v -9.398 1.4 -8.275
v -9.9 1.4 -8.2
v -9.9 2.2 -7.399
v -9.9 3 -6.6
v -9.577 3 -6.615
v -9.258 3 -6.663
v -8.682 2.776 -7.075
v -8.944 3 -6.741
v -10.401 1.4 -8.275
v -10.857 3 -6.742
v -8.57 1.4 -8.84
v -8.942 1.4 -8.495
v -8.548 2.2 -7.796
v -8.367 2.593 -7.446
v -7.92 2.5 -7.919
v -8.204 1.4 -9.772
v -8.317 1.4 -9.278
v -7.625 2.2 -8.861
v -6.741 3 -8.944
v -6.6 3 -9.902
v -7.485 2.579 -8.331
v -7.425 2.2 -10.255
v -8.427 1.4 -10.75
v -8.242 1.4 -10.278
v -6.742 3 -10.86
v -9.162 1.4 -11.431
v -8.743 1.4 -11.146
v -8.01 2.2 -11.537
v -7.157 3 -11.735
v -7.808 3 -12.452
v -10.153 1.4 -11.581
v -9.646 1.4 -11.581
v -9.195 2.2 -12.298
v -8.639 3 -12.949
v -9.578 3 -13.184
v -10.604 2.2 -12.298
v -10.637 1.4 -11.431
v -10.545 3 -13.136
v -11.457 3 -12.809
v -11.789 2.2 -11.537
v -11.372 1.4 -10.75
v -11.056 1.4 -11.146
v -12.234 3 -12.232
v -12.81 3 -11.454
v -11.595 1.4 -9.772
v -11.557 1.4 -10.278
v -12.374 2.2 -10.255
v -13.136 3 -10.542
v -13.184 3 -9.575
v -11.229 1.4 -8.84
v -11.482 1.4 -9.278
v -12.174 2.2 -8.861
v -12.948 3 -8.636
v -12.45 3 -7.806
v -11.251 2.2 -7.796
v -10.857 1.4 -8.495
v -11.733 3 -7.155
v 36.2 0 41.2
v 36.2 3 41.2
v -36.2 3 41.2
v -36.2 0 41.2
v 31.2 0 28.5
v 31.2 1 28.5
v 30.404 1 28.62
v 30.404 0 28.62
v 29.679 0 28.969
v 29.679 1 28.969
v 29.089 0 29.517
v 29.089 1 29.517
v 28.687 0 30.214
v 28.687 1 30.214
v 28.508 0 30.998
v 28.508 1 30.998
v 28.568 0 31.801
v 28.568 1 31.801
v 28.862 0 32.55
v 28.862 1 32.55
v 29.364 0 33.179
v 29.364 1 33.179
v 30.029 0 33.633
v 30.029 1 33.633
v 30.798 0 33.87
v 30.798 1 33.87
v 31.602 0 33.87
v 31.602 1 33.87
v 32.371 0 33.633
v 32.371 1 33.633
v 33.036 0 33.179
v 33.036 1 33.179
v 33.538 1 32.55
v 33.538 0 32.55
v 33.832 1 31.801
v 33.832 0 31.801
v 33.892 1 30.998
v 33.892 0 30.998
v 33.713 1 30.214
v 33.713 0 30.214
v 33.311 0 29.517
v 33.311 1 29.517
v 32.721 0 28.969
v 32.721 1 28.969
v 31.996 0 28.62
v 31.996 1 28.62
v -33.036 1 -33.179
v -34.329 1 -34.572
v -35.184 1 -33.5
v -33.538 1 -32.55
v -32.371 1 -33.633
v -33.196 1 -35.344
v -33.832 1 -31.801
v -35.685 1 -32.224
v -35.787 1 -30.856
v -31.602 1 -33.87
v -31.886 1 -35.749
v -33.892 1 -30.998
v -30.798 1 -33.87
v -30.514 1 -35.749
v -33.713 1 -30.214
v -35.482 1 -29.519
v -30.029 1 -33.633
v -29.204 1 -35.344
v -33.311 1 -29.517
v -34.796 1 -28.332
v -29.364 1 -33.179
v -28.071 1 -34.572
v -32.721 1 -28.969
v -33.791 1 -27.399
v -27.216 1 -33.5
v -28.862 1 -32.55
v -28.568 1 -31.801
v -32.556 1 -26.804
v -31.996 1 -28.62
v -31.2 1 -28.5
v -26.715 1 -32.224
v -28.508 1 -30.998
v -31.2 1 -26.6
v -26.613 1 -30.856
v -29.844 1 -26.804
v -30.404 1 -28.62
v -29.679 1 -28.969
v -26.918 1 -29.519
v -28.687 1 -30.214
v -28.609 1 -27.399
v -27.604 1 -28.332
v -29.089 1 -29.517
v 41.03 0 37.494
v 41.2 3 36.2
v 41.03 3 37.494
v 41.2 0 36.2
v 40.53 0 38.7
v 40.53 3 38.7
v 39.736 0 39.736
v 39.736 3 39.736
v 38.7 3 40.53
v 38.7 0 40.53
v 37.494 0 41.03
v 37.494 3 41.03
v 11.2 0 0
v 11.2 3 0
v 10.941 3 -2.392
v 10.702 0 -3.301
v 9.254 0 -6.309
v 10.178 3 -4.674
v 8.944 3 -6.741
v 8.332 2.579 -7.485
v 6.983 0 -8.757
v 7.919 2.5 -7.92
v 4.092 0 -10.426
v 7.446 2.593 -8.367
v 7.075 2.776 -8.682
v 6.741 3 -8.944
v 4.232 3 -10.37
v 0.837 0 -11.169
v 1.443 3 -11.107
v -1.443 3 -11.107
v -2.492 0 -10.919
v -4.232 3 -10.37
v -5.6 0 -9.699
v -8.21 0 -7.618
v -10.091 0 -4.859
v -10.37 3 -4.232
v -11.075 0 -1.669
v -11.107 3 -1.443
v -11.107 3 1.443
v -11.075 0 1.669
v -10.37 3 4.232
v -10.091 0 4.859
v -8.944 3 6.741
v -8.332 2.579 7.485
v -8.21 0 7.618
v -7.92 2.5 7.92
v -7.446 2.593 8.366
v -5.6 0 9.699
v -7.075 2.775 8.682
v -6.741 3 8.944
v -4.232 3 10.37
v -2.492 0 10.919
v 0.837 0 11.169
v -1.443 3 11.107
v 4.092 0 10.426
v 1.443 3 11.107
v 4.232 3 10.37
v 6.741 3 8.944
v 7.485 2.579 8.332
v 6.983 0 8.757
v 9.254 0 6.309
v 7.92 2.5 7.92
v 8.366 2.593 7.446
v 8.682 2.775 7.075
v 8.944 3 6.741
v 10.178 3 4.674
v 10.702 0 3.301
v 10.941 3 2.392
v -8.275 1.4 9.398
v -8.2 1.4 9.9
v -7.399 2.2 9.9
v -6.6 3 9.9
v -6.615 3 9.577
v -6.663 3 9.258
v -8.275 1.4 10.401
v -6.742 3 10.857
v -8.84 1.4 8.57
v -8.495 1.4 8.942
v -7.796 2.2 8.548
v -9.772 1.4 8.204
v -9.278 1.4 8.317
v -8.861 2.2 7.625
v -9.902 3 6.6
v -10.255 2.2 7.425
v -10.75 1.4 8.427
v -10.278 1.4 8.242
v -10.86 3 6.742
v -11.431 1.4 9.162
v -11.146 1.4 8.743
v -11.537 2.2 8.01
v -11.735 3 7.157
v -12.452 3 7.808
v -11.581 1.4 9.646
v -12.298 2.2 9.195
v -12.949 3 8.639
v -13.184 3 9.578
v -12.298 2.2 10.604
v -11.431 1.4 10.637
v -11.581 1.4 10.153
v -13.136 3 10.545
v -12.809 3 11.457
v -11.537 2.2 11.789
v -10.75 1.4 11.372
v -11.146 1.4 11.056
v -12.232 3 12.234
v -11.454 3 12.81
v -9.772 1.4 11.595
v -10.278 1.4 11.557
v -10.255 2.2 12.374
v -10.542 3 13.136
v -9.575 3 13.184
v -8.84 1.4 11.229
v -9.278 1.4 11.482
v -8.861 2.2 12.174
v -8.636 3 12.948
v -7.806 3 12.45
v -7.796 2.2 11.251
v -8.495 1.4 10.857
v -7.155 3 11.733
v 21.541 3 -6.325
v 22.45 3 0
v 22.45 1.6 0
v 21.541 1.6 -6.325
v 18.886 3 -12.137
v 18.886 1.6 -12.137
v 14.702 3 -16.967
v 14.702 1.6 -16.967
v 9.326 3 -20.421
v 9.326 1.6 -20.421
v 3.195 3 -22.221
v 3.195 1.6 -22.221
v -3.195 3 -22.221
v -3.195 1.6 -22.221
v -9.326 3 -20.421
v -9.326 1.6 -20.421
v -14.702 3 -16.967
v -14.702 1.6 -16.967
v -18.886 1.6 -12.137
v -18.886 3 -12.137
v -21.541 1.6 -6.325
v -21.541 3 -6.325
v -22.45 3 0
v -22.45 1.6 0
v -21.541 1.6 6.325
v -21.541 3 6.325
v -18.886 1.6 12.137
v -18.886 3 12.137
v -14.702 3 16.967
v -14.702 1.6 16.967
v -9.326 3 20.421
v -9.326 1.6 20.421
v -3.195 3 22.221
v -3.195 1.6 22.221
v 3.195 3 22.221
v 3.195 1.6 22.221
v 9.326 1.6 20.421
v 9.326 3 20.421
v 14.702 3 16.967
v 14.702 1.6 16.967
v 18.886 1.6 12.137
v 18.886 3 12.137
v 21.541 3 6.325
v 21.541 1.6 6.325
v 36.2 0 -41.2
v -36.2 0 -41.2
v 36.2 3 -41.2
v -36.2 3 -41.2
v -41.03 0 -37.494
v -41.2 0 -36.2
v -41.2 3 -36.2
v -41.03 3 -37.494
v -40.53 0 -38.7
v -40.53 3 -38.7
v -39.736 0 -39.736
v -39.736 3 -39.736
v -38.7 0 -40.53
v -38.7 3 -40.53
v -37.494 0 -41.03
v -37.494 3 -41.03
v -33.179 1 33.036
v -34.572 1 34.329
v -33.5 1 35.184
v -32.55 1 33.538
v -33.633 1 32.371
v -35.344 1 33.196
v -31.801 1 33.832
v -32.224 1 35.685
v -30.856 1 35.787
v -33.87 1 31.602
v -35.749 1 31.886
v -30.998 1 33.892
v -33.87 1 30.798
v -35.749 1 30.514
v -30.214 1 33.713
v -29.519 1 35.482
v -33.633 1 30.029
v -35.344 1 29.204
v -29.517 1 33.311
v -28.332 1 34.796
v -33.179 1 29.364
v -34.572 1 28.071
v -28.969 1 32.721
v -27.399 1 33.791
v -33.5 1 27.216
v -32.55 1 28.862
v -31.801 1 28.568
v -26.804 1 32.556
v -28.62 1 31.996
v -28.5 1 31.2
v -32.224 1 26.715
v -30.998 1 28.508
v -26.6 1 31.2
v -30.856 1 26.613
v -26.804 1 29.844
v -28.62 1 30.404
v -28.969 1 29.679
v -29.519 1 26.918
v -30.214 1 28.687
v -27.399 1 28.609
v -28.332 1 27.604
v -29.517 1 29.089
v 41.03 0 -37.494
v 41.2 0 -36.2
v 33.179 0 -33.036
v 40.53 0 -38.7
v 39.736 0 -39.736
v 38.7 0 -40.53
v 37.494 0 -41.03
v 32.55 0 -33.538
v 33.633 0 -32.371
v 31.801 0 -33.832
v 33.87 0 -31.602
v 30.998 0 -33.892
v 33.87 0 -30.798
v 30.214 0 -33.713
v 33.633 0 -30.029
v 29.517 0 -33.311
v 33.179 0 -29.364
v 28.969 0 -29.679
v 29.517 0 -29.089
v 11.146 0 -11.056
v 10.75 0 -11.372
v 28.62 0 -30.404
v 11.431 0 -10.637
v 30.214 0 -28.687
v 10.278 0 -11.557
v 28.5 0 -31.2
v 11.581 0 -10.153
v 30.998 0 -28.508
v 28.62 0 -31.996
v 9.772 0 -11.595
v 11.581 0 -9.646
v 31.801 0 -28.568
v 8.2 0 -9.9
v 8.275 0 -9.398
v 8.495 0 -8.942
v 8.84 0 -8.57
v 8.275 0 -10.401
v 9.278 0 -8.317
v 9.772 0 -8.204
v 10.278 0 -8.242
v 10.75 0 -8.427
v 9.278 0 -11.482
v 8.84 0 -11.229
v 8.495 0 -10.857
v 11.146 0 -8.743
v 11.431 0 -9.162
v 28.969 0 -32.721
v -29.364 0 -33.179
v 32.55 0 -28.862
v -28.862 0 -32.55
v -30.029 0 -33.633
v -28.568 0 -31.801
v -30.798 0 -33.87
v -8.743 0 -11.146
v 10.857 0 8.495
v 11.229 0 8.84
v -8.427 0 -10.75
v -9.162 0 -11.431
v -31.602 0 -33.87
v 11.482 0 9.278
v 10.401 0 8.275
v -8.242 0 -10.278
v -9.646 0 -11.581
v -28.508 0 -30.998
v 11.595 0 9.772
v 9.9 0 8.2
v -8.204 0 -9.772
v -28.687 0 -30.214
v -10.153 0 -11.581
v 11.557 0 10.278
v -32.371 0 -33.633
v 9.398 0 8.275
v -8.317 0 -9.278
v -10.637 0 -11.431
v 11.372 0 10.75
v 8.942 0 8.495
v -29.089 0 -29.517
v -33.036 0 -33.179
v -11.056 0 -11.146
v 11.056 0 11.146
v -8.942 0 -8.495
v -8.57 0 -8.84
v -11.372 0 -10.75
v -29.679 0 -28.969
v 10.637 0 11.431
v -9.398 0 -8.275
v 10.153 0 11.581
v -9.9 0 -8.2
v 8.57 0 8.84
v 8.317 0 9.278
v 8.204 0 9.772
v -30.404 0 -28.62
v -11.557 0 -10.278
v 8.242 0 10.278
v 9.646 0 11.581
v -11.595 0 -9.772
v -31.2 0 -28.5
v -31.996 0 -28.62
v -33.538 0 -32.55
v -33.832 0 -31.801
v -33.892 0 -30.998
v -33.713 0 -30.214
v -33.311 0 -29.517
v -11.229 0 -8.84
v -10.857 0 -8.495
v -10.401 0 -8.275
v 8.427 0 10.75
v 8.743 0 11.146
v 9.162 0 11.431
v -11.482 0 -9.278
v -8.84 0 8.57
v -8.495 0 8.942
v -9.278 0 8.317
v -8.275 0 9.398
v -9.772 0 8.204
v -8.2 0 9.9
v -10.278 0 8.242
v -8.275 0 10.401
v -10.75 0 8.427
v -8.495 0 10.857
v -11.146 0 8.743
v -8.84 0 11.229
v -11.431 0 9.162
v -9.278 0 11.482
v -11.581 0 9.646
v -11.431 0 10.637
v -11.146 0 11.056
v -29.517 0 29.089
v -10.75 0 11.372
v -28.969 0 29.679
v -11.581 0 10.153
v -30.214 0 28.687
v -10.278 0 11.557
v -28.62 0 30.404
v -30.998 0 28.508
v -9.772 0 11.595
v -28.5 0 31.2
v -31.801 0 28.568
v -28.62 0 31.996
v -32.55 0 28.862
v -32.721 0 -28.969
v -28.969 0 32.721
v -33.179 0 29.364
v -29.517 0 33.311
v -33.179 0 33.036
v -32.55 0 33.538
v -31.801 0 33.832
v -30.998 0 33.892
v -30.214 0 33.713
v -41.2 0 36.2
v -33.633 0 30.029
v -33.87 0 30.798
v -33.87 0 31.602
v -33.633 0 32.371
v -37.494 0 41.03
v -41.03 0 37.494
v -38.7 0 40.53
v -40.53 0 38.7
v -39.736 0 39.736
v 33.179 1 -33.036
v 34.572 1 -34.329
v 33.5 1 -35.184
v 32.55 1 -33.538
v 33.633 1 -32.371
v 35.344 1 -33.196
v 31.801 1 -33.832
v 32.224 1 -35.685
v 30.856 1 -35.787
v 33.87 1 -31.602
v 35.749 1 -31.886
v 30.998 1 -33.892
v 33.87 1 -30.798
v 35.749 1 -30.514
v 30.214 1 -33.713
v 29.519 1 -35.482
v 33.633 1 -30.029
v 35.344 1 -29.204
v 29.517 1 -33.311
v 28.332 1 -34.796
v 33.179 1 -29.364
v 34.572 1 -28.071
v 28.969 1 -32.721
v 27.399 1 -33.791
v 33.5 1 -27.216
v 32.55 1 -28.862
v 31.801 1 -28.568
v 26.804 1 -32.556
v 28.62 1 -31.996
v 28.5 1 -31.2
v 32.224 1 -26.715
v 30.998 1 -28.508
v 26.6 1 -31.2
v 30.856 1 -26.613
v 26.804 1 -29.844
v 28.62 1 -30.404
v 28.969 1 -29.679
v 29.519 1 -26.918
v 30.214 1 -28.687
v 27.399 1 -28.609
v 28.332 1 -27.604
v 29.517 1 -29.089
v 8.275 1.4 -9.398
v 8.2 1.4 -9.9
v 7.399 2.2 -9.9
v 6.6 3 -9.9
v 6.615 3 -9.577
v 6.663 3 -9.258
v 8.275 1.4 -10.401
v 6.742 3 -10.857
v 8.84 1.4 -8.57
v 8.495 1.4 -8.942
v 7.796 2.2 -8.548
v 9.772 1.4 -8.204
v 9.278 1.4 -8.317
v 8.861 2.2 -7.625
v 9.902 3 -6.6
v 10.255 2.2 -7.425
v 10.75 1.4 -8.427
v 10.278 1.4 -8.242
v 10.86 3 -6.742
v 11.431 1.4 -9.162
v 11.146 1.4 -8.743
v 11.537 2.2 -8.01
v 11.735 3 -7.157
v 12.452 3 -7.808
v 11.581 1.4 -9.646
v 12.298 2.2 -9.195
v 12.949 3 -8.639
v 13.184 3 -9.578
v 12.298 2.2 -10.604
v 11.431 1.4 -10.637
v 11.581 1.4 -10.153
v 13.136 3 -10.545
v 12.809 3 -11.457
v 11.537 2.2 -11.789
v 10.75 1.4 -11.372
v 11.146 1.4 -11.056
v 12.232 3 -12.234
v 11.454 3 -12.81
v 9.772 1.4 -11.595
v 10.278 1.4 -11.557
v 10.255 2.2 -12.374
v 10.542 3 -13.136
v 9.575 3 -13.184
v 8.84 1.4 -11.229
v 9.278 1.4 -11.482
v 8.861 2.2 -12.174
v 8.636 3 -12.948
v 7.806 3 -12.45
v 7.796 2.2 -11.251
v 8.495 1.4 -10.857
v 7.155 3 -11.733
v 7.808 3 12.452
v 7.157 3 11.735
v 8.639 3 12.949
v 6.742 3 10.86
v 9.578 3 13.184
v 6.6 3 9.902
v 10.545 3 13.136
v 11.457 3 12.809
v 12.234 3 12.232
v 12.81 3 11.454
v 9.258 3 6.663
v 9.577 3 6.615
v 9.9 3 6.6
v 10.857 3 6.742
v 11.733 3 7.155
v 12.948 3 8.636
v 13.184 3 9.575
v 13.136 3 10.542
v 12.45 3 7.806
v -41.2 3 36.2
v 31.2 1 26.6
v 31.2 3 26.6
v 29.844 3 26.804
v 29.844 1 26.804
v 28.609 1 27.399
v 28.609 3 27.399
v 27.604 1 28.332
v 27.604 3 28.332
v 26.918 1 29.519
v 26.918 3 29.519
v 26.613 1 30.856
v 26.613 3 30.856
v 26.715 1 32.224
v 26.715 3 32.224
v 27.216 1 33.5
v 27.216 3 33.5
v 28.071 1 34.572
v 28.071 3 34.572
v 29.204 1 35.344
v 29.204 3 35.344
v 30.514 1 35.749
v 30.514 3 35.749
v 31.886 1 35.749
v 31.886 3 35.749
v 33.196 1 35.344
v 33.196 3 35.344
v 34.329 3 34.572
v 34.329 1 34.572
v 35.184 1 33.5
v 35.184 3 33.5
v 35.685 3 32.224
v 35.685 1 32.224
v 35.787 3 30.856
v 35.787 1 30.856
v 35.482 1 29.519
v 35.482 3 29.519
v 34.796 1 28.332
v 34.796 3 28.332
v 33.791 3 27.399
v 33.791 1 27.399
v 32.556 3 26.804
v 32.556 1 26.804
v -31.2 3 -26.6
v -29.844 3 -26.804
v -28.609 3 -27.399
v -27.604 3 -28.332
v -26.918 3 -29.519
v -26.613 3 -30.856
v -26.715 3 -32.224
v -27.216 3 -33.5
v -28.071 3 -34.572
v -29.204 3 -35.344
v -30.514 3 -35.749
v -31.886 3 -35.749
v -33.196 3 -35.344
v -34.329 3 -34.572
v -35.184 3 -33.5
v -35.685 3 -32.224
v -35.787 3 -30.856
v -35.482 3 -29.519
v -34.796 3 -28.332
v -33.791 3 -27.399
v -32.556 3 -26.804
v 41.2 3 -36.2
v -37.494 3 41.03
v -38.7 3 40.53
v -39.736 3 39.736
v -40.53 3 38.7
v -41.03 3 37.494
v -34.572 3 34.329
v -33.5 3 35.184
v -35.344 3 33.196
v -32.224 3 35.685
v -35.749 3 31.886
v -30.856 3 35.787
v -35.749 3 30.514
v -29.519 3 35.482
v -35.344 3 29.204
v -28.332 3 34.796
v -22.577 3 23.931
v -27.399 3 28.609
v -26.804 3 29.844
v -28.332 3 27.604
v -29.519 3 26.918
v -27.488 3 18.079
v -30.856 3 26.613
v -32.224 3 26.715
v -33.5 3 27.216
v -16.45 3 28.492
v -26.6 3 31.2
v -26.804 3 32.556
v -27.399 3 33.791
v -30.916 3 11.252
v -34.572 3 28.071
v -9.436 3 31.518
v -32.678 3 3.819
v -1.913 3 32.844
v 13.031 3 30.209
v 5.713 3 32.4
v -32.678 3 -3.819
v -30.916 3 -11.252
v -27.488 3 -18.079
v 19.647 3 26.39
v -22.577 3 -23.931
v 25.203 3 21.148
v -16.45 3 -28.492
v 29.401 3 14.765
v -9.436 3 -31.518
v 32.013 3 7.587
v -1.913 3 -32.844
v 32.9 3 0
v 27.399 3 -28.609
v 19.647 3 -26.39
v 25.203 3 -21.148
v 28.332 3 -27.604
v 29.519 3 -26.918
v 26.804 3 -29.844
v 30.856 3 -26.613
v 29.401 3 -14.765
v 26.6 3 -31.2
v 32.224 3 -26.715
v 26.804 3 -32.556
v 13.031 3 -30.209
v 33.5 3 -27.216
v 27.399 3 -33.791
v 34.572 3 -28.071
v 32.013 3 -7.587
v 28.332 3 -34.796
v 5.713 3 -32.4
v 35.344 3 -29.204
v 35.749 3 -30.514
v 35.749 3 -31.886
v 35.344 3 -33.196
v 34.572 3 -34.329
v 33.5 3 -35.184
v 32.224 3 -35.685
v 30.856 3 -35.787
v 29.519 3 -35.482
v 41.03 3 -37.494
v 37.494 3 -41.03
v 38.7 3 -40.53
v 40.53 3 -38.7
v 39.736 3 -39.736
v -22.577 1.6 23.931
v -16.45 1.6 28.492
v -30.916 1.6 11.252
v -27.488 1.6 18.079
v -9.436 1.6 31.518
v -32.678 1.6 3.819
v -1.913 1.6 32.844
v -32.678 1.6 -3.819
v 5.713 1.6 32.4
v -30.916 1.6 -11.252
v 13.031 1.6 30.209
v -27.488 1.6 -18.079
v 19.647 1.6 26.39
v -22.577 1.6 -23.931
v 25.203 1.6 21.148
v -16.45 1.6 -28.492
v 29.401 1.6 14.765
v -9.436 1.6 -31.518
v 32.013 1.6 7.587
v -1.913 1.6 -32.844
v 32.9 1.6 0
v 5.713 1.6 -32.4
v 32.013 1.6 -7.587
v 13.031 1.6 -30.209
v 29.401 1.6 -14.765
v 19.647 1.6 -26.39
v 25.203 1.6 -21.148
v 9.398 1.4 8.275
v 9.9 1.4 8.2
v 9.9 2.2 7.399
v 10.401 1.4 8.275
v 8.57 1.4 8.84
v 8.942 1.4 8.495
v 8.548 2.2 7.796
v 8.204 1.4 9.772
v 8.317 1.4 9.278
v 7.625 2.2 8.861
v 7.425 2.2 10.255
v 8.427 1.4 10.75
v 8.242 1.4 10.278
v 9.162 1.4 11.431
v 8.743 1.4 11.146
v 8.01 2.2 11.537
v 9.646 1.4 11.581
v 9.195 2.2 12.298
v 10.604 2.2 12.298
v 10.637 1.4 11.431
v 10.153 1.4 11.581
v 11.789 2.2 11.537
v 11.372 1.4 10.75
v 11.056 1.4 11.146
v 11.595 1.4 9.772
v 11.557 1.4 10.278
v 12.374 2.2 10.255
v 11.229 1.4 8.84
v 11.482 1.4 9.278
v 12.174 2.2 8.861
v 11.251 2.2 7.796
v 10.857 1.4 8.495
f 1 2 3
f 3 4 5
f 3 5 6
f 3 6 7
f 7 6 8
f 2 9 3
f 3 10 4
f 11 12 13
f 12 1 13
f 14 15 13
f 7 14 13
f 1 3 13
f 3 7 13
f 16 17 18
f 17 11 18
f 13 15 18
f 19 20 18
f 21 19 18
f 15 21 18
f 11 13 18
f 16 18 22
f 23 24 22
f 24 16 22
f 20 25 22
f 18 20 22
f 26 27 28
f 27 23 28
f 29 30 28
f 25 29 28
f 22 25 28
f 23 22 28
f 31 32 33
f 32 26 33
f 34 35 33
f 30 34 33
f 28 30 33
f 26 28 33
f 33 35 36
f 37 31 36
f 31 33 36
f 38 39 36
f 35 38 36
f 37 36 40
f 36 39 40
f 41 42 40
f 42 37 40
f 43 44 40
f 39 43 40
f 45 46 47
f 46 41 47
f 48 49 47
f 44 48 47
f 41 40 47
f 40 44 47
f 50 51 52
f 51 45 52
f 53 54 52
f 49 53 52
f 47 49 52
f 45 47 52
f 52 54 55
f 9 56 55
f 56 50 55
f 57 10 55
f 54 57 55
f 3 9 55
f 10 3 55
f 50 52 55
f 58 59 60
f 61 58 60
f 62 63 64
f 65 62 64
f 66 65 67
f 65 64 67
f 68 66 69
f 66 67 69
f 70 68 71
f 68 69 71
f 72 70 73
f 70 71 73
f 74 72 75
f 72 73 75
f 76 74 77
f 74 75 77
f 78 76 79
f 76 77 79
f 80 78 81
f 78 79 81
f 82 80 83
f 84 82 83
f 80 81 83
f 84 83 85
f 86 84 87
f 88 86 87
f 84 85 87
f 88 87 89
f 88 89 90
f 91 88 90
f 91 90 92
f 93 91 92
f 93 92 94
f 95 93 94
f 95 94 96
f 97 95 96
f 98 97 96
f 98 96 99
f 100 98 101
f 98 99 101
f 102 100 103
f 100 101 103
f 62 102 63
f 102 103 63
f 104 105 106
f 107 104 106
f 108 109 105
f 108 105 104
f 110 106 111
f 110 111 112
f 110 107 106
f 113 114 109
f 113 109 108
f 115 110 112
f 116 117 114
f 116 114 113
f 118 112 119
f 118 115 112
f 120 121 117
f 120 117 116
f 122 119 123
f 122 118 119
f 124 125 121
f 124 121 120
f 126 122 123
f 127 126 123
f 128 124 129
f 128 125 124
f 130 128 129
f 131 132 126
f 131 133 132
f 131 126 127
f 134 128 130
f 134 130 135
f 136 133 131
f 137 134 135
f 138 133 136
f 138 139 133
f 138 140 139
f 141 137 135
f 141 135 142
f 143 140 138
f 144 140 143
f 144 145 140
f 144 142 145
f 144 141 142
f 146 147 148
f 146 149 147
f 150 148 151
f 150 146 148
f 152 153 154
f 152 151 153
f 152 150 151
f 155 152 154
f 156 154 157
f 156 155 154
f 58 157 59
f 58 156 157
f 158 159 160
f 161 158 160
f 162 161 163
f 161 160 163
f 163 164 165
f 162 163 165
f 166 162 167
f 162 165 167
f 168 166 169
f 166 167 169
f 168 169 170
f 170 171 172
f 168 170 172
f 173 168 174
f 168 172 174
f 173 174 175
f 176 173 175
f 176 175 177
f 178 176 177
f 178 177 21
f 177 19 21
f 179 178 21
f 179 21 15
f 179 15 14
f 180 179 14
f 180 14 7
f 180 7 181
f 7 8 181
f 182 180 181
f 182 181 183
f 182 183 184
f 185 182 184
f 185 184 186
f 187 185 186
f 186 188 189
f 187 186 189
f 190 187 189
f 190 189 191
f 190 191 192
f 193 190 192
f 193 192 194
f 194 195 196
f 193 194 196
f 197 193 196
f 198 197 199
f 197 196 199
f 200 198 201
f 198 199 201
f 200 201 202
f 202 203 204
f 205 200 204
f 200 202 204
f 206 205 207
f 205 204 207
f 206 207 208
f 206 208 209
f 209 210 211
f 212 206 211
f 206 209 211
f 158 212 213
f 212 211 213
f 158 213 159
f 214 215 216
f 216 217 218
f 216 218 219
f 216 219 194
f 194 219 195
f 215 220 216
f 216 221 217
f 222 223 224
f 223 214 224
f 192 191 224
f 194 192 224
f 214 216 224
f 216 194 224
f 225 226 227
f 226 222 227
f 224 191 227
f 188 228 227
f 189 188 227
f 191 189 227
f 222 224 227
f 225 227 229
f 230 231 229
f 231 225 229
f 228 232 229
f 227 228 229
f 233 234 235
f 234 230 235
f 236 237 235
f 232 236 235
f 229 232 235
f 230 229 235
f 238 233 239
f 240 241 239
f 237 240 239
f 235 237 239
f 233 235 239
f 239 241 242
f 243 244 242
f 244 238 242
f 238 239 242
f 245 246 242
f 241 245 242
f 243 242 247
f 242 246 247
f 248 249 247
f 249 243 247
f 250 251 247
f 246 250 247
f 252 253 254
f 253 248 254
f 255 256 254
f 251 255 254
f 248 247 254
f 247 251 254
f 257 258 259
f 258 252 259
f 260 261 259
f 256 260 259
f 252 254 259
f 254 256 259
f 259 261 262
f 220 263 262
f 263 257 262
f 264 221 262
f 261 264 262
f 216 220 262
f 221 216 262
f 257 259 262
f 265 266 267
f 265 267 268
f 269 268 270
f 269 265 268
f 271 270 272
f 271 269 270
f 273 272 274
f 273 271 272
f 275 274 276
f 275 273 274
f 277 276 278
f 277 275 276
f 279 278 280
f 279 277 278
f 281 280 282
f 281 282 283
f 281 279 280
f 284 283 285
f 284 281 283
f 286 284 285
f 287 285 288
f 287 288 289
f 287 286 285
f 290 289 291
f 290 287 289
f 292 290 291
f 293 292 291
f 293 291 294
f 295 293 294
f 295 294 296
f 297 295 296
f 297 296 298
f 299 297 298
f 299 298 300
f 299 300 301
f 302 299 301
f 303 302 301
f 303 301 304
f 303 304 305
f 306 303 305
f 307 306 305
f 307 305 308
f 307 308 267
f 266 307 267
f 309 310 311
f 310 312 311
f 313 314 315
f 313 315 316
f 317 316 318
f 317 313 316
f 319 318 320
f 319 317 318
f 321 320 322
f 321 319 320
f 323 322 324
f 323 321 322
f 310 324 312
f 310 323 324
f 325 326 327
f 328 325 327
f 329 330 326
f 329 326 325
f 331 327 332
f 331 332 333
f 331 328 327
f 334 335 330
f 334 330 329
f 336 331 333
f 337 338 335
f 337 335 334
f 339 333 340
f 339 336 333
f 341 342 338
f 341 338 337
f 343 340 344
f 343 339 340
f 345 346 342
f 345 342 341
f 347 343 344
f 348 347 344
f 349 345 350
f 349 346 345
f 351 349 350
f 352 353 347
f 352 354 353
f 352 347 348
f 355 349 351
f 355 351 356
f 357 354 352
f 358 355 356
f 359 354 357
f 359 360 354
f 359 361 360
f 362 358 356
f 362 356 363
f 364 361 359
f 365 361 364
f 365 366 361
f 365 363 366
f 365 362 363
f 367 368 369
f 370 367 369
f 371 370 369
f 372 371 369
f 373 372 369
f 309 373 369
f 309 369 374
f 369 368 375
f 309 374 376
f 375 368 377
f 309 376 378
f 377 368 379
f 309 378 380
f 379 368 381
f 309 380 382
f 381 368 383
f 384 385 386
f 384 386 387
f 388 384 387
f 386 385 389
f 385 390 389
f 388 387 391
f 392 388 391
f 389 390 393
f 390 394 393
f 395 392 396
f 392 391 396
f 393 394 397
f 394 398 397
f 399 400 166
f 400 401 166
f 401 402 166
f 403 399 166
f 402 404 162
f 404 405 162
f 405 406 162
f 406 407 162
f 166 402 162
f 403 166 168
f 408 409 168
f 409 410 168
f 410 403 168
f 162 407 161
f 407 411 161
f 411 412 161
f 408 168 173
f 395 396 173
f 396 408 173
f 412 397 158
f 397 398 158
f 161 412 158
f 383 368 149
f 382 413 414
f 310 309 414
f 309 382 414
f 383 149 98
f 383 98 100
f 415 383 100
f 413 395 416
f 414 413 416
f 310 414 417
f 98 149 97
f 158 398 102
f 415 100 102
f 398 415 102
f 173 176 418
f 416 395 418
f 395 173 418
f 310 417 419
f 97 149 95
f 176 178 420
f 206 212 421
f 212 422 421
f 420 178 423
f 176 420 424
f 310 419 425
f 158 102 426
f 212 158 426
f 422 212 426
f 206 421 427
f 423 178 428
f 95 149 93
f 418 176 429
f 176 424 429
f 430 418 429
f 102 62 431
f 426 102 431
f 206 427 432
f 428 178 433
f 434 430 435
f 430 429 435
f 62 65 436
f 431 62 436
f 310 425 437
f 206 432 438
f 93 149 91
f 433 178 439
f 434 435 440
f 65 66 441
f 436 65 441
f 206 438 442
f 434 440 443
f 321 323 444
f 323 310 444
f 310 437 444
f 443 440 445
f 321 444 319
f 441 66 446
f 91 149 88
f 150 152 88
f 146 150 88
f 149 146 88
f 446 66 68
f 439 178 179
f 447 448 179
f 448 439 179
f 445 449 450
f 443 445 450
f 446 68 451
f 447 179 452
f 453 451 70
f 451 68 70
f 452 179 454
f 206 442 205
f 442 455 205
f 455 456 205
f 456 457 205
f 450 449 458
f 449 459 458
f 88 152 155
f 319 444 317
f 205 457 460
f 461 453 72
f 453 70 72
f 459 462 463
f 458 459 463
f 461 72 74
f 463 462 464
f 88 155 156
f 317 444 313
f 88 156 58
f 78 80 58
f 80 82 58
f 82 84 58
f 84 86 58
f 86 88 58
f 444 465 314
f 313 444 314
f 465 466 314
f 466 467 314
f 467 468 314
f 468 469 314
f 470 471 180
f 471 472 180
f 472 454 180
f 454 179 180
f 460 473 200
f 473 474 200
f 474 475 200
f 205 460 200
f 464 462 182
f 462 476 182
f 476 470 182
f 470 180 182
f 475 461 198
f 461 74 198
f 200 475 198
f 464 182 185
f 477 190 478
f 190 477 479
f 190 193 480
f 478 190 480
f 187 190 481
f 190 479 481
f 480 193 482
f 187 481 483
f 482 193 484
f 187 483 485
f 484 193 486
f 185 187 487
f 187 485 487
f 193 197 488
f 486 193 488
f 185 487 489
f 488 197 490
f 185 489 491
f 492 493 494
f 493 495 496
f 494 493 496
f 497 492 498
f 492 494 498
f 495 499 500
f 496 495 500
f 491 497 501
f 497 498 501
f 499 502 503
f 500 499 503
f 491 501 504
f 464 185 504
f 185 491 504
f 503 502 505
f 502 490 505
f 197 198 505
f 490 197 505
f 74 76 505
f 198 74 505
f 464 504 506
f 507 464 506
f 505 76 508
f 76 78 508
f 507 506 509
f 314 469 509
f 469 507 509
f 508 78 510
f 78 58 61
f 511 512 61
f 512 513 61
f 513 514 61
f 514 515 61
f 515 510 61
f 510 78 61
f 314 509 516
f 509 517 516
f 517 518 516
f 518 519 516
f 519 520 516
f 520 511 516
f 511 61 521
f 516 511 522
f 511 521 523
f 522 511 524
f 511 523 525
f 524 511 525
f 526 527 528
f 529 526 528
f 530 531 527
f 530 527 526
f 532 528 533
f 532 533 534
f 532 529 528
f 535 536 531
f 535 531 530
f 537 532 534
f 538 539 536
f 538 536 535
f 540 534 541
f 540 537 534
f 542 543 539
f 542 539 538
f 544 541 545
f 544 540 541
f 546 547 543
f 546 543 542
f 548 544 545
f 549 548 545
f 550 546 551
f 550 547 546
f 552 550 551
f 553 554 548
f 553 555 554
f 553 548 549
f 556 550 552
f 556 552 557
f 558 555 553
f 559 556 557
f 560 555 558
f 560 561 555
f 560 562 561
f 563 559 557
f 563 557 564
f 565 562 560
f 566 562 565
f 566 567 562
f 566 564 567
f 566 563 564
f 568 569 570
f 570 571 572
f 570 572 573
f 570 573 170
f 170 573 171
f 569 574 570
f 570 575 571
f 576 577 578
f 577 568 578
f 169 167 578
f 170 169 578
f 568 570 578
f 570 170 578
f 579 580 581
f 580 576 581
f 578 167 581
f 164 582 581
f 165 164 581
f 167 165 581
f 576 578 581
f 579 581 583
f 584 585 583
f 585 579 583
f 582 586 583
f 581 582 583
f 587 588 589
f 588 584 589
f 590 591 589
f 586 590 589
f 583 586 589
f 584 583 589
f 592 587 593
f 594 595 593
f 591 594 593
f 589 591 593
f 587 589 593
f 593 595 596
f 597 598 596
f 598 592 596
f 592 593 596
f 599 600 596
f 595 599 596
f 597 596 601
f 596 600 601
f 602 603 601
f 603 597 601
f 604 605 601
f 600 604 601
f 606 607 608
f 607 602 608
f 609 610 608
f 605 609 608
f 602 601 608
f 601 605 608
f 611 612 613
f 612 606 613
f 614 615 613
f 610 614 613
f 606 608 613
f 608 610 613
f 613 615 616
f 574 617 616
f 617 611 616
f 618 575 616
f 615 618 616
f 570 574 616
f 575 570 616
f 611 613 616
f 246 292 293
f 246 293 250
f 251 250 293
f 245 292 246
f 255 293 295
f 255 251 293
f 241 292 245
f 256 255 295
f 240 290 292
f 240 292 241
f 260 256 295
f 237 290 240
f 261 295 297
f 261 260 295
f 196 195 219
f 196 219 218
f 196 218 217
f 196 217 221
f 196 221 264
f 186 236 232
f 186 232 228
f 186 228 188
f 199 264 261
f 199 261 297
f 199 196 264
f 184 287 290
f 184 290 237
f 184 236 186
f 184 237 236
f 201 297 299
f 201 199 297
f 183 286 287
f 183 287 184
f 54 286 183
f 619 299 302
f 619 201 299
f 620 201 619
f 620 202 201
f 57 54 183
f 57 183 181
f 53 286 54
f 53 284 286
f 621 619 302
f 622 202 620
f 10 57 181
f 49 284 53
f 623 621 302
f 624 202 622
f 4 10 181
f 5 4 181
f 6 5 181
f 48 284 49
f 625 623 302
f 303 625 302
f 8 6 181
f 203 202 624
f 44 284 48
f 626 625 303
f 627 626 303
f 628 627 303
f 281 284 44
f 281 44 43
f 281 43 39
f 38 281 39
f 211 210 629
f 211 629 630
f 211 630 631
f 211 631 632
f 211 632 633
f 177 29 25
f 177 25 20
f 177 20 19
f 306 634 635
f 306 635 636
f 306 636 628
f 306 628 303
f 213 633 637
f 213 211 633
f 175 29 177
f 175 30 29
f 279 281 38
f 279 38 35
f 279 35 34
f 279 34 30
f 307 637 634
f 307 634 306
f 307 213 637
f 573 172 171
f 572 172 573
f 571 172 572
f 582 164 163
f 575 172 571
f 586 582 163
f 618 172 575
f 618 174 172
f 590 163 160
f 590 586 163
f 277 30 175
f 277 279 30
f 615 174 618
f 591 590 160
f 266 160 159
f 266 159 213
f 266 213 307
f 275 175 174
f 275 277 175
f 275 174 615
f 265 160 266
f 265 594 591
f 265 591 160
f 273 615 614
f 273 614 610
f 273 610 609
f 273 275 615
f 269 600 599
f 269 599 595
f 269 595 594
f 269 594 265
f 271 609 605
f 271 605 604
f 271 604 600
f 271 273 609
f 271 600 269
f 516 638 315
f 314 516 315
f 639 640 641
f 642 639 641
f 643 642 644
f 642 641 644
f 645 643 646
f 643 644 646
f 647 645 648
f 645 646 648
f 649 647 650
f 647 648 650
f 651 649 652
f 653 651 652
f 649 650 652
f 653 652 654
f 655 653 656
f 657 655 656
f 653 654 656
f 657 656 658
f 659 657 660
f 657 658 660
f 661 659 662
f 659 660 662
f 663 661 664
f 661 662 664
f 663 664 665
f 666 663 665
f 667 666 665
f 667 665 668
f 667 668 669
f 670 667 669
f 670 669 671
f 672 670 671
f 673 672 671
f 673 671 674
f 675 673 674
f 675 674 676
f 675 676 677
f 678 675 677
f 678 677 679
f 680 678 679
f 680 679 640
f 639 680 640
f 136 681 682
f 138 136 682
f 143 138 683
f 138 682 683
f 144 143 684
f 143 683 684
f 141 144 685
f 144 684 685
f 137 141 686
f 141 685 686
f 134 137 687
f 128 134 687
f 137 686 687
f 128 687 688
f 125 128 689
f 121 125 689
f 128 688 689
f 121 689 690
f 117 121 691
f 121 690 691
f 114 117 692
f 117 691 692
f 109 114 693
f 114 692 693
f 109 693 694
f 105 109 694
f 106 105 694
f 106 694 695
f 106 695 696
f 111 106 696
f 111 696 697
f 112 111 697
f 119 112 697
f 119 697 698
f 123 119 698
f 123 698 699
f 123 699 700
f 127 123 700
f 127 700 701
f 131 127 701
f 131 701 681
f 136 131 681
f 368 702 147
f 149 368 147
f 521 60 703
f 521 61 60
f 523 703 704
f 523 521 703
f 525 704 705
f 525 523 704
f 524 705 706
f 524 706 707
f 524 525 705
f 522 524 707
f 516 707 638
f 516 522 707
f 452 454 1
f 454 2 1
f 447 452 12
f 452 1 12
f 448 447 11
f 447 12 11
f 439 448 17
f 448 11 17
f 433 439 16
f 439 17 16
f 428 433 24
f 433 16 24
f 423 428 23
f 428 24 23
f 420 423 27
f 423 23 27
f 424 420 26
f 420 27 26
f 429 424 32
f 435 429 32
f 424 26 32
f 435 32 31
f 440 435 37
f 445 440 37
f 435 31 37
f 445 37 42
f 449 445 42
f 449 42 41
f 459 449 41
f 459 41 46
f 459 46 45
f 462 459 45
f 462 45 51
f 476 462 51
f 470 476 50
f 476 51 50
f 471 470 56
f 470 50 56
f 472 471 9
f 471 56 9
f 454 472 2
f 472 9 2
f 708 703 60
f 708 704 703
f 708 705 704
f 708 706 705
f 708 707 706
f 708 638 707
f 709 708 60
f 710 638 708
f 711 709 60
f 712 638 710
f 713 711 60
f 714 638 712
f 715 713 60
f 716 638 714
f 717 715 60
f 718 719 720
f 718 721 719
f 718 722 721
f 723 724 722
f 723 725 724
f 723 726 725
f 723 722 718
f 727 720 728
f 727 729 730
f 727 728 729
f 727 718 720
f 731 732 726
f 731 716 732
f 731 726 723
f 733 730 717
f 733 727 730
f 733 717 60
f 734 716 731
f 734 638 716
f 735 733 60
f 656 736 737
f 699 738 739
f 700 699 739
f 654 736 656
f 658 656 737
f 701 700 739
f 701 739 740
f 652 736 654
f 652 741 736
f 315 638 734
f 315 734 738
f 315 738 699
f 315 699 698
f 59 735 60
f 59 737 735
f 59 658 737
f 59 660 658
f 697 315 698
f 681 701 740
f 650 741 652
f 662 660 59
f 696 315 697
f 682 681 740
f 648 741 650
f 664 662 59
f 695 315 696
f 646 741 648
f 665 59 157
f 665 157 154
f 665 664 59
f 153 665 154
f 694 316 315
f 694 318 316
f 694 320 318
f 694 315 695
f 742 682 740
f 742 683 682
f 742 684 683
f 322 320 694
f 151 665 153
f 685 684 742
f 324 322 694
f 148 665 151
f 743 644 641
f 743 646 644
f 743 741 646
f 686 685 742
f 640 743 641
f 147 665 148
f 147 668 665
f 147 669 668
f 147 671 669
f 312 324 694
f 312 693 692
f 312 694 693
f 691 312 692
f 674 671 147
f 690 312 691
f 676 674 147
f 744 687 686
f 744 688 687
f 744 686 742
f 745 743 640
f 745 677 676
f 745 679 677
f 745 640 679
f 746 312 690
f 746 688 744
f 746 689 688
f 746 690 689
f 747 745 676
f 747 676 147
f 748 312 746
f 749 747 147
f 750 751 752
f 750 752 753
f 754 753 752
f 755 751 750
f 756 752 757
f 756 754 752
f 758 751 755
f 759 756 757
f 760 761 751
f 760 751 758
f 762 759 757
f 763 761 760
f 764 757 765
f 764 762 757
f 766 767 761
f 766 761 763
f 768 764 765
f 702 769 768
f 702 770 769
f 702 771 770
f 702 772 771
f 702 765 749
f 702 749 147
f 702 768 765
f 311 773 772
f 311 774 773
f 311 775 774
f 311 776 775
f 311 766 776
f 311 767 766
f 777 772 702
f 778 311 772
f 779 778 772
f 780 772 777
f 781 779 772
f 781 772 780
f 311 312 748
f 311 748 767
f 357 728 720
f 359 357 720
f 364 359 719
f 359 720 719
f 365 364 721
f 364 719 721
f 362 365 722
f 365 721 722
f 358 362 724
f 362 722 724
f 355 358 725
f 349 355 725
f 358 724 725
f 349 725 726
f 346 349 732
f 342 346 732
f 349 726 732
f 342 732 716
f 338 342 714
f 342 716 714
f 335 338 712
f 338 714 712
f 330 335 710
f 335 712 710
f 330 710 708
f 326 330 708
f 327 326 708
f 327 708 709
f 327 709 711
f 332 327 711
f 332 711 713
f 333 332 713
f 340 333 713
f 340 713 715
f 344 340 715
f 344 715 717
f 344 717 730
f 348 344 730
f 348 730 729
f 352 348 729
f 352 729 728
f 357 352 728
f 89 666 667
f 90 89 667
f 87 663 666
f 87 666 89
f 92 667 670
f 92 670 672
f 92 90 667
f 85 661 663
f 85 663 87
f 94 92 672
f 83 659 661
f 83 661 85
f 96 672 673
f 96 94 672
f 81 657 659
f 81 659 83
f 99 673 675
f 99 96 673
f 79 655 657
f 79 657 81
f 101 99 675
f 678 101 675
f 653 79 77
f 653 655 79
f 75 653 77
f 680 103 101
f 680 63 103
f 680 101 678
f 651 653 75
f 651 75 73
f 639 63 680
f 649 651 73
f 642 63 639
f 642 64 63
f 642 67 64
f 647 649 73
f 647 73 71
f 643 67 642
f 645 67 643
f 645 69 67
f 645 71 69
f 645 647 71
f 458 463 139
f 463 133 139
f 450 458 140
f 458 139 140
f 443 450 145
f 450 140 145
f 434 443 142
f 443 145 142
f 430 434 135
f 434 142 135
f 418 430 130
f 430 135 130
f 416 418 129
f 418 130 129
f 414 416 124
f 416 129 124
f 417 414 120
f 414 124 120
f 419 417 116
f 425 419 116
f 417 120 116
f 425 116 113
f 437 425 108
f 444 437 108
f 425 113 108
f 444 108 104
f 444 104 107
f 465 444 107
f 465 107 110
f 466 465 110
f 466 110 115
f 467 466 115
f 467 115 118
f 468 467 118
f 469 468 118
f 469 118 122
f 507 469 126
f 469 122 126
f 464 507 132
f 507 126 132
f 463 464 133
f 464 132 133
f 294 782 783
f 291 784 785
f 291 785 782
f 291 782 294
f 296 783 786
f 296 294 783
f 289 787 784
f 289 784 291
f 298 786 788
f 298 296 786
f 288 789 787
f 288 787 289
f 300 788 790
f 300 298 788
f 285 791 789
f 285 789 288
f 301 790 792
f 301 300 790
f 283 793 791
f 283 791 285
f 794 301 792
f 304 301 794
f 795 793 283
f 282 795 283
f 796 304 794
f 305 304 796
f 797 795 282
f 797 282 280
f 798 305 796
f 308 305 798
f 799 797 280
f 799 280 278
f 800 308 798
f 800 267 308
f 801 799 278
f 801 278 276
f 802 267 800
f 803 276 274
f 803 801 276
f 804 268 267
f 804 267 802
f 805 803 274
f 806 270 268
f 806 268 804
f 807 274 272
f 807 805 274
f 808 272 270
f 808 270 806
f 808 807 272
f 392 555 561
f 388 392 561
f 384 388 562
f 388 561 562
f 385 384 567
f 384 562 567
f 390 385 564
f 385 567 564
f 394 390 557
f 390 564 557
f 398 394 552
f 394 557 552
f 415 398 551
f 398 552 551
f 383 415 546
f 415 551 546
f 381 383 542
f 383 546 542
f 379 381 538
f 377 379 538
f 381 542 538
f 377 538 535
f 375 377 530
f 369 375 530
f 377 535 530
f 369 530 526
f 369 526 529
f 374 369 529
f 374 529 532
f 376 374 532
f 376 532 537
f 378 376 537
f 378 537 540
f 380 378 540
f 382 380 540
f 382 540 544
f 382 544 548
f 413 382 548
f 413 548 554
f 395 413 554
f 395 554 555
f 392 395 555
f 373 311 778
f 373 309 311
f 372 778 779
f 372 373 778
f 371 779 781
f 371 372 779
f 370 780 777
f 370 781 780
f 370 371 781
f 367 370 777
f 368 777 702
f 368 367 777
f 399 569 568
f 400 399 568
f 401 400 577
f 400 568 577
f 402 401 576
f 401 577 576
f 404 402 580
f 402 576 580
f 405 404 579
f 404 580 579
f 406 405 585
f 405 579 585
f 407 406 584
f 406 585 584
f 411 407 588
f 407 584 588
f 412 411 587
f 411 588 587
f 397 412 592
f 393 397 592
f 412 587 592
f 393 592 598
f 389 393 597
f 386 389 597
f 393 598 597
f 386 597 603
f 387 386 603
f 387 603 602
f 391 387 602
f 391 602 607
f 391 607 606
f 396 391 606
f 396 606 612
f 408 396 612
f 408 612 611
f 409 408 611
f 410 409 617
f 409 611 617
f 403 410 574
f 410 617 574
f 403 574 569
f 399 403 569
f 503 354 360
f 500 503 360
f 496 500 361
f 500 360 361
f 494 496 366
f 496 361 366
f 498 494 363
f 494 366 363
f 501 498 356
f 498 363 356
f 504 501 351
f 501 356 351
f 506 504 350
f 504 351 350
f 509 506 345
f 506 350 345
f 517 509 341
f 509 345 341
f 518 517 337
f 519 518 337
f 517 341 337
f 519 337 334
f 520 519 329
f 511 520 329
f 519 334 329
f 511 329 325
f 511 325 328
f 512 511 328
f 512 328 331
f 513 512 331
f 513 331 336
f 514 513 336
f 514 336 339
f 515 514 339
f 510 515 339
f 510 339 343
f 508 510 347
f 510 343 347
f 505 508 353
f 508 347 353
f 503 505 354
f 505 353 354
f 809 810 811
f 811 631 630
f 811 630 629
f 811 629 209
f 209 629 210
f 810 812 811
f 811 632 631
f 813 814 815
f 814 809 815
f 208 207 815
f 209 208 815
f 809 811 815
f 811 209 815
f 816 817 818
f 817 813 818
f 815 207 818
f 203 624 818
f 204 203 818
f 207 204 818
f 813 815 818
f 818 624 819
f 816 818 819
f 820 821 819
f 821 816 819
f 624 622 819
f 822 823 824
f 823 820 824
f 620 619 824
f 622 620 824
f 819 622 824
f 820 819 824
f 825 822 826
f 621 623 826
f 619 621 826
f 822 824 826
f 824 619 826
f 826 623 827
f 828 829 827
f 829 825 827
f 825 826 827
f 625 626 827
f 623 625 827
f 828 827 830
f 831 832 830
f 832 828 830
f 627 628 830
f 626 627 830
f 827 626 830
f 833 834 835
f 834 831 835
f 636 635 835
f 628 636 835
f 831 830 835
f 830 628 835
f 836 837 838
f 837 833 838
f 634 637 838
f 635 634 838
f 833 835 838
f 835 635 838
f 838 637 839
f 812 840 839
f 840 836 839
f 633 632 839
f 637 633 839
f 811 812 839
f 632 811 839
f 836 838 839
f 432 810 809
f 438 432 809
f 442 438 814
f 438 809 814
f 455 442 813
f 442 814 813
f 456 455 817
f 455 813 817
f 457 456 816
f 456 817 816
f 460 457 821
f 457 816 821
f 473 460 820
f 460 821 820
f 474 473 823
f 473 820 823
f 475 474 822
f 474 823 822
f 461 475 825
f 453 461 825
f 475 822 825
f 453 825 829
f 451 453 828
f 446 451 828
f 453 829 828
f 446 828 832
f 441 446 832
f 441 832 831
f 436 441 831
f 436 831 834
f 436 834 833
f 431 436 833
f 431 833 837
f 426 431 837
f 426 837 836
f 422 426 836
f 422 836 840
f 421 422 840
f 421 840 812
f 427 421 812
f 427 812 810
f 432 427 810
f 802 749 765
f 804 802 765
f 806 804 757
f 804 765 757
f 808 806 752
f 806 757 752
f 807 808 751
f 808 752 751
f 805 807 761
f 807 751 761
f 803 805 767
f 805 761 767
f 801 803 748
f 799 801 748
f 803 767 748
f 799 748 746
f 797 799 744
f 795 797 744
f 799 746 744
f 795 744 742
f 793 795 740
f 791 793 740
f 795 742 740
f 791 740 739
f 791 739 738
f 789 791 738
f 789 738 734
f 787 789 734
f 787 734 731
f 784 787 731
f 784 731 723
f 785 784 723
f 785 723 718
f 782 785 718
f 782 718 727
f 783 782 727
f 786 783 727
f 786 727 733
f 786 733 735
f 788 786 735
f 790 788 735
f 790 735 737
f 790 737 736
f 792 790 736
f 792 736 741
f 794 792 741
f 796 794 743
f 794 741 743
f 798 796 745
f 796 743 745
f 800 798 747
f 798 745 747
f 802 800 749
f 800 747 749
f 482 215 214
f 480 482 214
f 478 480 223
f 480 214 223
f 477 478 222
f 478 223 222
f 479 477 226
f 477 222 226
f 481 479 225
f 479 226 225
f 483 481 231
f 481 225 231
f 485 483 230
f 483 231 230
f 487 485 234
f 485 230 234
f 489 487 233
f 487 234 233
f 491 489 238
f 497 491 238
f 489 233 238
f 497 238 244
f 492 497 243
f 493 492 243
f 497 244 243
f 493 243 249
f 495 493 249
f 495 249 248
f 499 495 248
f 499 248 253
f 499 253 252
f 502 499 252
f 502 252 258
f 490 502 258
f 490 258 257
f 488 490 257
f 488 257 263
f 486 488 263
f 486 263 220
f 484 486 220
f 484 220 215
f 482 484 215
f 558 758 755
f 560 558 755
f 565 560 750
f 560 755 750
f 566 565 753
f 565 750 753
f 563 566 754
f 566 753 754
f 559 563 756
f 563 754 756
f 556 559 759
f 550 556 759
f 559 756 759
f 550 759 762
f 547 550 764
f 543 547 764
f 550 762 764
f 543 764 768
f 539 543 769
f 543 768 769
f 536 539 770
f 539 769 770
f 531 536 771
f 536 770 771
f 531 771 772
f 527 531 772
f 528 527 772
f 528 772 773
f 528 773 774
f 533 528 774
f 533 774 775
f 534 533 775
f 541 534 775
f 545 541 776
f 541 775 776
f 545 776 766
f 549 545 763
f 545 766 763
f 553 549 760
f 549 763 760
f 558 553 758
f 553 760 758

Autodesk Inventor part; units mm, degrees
ref_plane "YZ Plane" through (0, 0, 0) normal (1, 0, 0) x (0, 1, 0)
ref_plane "XZ Plane" through (0, 0, 0) normal (0, 1, 0) x (-1, 0, 0)
ref_plane "XY Plane" through (0, 0, 0) normal (0, 0, 1) x (1, 0, 0)
sketch "Boceto1" plane through (0, 0, 0) normal (0, 1, 0) x (-1, 0, 0)
  circle A0 centre (0, 0) radius 35
  dimension "d0" = 70
extrude "Extrusión1" add sketch "Boceto1" along normal blind 3
sketch "Boceto2" plane through (0, 3, 0) normal (0, 1, 0) x (1, 0, 0)
  circle A0 centre (0, 0) radius 22.45
  circle A1 centre (0, 0) radius 32.9
  dimension "d4" = 44.9
  dimension "d5" = 65.8
extrude "Extrusión2" cut sketch "Boceto2" against normal blind 1.4
sketch "Boceto3" plane through (0, 3, 0) normal (0, 1, 0) x (1, 0, 0)
  circle A0 centre (0, 0) radius 17.5
  dimension "d8" = 35
extrude "Extrusión3" cut sketch "Boceto3" against normal through all
sketch "Boceto4" plane through (0, 3, 0) normal (0, 1, 0) x (1, 0, 0)
  circle A0 centre (0, 0) radius 17.5 projected
  circle A1 centre (0, 0) radius 11.2
  line L0 (41.2, -41.2) -> (-41.2, -41.2)
  line L1 (-41.2, -41.2) -> (-41.2, 41.2)
  line L2 (-41.2, 41.2) -> (41.2, 41.2)
  line L3 (41.2, 41.2) -> (41.2, -41.2)
  line L4 (41.2, -41.2) -> (-41.2, 41.2) construction
  line L5 (-41.2, -41.2) -> (41.2, 41.2) construction
  circle A2 centre (0, 0) radius 35 projected
  dimension "d11" = 22.4
  dimension "d12" = 82.4
  dimension "d13" = 82.4
extrude "Extrusión4" add sketch "Boceto4" against normal up to surface (3 mm away)
sketch "Boceto5" plane through (0, 3, 0) normal (0, 1, 0) x (1, 0, 0)
  circle A0 centre (0, 0) radius 14
  circle A1 centre (-9.8995, -9.8995) radius 1.7
  line L0 (0, 0) -> (0, -14)
  line L1 (0, 0) -> (-9.8995, -9.8995)
  circle A2 centre (-31.2, -31.2) radius 2.7
  line L2 (-41.2, 41.2) -> (-41.2, -41.2) projected
  line L3 (-41.2, -41.2) -> (41.2, -41.2) projected
  dimension "d16" = 3.4
  dimension "d17" = 28
  dimension "d18" = 45
  dimension "d21" = 10
  dimension "d22" = 10
  dimension "d23" = 5.4
extrude "Extrusión5" cut sketch "Boceto5" against normal through all contours A1 A0 | A0 L1 A1 | A1 L1 A0 | A2
sketch "Boceto6" plane through (0, 3, 0) normal (0, 1, 0) x (1, 0, 0)
  circle A0 centre (-31.2, -31.2) radius 2.7 projected
  circle A1 centre (-31.2, -31.2) radius 4.6
  point P0 (0, 0)
  dimension "d24" = 9.2
extrude "Extrusión6" cut sketch "Boceto6" against normal blind 2
chamfer "Chaflán1" distance 1.6 angle 45 1 edges at (-11.5995, 3, 9.8995)
pattern_circular "Patrón circular1" count 4 over 360 about axis through (0, 3, 0) along (0, -1, 0) of "Extrusión5", "Extrusión6", "Chaflán1"
fillet "Empalme1" radius 5 4 edges at (-41.2, 1.5, 41.2) (41.2, 1.5, 41.2) (41.2, 1.5, -41.2) (-41.2, 1.5, -41.2)
properties part number "Motor Support Plate"
